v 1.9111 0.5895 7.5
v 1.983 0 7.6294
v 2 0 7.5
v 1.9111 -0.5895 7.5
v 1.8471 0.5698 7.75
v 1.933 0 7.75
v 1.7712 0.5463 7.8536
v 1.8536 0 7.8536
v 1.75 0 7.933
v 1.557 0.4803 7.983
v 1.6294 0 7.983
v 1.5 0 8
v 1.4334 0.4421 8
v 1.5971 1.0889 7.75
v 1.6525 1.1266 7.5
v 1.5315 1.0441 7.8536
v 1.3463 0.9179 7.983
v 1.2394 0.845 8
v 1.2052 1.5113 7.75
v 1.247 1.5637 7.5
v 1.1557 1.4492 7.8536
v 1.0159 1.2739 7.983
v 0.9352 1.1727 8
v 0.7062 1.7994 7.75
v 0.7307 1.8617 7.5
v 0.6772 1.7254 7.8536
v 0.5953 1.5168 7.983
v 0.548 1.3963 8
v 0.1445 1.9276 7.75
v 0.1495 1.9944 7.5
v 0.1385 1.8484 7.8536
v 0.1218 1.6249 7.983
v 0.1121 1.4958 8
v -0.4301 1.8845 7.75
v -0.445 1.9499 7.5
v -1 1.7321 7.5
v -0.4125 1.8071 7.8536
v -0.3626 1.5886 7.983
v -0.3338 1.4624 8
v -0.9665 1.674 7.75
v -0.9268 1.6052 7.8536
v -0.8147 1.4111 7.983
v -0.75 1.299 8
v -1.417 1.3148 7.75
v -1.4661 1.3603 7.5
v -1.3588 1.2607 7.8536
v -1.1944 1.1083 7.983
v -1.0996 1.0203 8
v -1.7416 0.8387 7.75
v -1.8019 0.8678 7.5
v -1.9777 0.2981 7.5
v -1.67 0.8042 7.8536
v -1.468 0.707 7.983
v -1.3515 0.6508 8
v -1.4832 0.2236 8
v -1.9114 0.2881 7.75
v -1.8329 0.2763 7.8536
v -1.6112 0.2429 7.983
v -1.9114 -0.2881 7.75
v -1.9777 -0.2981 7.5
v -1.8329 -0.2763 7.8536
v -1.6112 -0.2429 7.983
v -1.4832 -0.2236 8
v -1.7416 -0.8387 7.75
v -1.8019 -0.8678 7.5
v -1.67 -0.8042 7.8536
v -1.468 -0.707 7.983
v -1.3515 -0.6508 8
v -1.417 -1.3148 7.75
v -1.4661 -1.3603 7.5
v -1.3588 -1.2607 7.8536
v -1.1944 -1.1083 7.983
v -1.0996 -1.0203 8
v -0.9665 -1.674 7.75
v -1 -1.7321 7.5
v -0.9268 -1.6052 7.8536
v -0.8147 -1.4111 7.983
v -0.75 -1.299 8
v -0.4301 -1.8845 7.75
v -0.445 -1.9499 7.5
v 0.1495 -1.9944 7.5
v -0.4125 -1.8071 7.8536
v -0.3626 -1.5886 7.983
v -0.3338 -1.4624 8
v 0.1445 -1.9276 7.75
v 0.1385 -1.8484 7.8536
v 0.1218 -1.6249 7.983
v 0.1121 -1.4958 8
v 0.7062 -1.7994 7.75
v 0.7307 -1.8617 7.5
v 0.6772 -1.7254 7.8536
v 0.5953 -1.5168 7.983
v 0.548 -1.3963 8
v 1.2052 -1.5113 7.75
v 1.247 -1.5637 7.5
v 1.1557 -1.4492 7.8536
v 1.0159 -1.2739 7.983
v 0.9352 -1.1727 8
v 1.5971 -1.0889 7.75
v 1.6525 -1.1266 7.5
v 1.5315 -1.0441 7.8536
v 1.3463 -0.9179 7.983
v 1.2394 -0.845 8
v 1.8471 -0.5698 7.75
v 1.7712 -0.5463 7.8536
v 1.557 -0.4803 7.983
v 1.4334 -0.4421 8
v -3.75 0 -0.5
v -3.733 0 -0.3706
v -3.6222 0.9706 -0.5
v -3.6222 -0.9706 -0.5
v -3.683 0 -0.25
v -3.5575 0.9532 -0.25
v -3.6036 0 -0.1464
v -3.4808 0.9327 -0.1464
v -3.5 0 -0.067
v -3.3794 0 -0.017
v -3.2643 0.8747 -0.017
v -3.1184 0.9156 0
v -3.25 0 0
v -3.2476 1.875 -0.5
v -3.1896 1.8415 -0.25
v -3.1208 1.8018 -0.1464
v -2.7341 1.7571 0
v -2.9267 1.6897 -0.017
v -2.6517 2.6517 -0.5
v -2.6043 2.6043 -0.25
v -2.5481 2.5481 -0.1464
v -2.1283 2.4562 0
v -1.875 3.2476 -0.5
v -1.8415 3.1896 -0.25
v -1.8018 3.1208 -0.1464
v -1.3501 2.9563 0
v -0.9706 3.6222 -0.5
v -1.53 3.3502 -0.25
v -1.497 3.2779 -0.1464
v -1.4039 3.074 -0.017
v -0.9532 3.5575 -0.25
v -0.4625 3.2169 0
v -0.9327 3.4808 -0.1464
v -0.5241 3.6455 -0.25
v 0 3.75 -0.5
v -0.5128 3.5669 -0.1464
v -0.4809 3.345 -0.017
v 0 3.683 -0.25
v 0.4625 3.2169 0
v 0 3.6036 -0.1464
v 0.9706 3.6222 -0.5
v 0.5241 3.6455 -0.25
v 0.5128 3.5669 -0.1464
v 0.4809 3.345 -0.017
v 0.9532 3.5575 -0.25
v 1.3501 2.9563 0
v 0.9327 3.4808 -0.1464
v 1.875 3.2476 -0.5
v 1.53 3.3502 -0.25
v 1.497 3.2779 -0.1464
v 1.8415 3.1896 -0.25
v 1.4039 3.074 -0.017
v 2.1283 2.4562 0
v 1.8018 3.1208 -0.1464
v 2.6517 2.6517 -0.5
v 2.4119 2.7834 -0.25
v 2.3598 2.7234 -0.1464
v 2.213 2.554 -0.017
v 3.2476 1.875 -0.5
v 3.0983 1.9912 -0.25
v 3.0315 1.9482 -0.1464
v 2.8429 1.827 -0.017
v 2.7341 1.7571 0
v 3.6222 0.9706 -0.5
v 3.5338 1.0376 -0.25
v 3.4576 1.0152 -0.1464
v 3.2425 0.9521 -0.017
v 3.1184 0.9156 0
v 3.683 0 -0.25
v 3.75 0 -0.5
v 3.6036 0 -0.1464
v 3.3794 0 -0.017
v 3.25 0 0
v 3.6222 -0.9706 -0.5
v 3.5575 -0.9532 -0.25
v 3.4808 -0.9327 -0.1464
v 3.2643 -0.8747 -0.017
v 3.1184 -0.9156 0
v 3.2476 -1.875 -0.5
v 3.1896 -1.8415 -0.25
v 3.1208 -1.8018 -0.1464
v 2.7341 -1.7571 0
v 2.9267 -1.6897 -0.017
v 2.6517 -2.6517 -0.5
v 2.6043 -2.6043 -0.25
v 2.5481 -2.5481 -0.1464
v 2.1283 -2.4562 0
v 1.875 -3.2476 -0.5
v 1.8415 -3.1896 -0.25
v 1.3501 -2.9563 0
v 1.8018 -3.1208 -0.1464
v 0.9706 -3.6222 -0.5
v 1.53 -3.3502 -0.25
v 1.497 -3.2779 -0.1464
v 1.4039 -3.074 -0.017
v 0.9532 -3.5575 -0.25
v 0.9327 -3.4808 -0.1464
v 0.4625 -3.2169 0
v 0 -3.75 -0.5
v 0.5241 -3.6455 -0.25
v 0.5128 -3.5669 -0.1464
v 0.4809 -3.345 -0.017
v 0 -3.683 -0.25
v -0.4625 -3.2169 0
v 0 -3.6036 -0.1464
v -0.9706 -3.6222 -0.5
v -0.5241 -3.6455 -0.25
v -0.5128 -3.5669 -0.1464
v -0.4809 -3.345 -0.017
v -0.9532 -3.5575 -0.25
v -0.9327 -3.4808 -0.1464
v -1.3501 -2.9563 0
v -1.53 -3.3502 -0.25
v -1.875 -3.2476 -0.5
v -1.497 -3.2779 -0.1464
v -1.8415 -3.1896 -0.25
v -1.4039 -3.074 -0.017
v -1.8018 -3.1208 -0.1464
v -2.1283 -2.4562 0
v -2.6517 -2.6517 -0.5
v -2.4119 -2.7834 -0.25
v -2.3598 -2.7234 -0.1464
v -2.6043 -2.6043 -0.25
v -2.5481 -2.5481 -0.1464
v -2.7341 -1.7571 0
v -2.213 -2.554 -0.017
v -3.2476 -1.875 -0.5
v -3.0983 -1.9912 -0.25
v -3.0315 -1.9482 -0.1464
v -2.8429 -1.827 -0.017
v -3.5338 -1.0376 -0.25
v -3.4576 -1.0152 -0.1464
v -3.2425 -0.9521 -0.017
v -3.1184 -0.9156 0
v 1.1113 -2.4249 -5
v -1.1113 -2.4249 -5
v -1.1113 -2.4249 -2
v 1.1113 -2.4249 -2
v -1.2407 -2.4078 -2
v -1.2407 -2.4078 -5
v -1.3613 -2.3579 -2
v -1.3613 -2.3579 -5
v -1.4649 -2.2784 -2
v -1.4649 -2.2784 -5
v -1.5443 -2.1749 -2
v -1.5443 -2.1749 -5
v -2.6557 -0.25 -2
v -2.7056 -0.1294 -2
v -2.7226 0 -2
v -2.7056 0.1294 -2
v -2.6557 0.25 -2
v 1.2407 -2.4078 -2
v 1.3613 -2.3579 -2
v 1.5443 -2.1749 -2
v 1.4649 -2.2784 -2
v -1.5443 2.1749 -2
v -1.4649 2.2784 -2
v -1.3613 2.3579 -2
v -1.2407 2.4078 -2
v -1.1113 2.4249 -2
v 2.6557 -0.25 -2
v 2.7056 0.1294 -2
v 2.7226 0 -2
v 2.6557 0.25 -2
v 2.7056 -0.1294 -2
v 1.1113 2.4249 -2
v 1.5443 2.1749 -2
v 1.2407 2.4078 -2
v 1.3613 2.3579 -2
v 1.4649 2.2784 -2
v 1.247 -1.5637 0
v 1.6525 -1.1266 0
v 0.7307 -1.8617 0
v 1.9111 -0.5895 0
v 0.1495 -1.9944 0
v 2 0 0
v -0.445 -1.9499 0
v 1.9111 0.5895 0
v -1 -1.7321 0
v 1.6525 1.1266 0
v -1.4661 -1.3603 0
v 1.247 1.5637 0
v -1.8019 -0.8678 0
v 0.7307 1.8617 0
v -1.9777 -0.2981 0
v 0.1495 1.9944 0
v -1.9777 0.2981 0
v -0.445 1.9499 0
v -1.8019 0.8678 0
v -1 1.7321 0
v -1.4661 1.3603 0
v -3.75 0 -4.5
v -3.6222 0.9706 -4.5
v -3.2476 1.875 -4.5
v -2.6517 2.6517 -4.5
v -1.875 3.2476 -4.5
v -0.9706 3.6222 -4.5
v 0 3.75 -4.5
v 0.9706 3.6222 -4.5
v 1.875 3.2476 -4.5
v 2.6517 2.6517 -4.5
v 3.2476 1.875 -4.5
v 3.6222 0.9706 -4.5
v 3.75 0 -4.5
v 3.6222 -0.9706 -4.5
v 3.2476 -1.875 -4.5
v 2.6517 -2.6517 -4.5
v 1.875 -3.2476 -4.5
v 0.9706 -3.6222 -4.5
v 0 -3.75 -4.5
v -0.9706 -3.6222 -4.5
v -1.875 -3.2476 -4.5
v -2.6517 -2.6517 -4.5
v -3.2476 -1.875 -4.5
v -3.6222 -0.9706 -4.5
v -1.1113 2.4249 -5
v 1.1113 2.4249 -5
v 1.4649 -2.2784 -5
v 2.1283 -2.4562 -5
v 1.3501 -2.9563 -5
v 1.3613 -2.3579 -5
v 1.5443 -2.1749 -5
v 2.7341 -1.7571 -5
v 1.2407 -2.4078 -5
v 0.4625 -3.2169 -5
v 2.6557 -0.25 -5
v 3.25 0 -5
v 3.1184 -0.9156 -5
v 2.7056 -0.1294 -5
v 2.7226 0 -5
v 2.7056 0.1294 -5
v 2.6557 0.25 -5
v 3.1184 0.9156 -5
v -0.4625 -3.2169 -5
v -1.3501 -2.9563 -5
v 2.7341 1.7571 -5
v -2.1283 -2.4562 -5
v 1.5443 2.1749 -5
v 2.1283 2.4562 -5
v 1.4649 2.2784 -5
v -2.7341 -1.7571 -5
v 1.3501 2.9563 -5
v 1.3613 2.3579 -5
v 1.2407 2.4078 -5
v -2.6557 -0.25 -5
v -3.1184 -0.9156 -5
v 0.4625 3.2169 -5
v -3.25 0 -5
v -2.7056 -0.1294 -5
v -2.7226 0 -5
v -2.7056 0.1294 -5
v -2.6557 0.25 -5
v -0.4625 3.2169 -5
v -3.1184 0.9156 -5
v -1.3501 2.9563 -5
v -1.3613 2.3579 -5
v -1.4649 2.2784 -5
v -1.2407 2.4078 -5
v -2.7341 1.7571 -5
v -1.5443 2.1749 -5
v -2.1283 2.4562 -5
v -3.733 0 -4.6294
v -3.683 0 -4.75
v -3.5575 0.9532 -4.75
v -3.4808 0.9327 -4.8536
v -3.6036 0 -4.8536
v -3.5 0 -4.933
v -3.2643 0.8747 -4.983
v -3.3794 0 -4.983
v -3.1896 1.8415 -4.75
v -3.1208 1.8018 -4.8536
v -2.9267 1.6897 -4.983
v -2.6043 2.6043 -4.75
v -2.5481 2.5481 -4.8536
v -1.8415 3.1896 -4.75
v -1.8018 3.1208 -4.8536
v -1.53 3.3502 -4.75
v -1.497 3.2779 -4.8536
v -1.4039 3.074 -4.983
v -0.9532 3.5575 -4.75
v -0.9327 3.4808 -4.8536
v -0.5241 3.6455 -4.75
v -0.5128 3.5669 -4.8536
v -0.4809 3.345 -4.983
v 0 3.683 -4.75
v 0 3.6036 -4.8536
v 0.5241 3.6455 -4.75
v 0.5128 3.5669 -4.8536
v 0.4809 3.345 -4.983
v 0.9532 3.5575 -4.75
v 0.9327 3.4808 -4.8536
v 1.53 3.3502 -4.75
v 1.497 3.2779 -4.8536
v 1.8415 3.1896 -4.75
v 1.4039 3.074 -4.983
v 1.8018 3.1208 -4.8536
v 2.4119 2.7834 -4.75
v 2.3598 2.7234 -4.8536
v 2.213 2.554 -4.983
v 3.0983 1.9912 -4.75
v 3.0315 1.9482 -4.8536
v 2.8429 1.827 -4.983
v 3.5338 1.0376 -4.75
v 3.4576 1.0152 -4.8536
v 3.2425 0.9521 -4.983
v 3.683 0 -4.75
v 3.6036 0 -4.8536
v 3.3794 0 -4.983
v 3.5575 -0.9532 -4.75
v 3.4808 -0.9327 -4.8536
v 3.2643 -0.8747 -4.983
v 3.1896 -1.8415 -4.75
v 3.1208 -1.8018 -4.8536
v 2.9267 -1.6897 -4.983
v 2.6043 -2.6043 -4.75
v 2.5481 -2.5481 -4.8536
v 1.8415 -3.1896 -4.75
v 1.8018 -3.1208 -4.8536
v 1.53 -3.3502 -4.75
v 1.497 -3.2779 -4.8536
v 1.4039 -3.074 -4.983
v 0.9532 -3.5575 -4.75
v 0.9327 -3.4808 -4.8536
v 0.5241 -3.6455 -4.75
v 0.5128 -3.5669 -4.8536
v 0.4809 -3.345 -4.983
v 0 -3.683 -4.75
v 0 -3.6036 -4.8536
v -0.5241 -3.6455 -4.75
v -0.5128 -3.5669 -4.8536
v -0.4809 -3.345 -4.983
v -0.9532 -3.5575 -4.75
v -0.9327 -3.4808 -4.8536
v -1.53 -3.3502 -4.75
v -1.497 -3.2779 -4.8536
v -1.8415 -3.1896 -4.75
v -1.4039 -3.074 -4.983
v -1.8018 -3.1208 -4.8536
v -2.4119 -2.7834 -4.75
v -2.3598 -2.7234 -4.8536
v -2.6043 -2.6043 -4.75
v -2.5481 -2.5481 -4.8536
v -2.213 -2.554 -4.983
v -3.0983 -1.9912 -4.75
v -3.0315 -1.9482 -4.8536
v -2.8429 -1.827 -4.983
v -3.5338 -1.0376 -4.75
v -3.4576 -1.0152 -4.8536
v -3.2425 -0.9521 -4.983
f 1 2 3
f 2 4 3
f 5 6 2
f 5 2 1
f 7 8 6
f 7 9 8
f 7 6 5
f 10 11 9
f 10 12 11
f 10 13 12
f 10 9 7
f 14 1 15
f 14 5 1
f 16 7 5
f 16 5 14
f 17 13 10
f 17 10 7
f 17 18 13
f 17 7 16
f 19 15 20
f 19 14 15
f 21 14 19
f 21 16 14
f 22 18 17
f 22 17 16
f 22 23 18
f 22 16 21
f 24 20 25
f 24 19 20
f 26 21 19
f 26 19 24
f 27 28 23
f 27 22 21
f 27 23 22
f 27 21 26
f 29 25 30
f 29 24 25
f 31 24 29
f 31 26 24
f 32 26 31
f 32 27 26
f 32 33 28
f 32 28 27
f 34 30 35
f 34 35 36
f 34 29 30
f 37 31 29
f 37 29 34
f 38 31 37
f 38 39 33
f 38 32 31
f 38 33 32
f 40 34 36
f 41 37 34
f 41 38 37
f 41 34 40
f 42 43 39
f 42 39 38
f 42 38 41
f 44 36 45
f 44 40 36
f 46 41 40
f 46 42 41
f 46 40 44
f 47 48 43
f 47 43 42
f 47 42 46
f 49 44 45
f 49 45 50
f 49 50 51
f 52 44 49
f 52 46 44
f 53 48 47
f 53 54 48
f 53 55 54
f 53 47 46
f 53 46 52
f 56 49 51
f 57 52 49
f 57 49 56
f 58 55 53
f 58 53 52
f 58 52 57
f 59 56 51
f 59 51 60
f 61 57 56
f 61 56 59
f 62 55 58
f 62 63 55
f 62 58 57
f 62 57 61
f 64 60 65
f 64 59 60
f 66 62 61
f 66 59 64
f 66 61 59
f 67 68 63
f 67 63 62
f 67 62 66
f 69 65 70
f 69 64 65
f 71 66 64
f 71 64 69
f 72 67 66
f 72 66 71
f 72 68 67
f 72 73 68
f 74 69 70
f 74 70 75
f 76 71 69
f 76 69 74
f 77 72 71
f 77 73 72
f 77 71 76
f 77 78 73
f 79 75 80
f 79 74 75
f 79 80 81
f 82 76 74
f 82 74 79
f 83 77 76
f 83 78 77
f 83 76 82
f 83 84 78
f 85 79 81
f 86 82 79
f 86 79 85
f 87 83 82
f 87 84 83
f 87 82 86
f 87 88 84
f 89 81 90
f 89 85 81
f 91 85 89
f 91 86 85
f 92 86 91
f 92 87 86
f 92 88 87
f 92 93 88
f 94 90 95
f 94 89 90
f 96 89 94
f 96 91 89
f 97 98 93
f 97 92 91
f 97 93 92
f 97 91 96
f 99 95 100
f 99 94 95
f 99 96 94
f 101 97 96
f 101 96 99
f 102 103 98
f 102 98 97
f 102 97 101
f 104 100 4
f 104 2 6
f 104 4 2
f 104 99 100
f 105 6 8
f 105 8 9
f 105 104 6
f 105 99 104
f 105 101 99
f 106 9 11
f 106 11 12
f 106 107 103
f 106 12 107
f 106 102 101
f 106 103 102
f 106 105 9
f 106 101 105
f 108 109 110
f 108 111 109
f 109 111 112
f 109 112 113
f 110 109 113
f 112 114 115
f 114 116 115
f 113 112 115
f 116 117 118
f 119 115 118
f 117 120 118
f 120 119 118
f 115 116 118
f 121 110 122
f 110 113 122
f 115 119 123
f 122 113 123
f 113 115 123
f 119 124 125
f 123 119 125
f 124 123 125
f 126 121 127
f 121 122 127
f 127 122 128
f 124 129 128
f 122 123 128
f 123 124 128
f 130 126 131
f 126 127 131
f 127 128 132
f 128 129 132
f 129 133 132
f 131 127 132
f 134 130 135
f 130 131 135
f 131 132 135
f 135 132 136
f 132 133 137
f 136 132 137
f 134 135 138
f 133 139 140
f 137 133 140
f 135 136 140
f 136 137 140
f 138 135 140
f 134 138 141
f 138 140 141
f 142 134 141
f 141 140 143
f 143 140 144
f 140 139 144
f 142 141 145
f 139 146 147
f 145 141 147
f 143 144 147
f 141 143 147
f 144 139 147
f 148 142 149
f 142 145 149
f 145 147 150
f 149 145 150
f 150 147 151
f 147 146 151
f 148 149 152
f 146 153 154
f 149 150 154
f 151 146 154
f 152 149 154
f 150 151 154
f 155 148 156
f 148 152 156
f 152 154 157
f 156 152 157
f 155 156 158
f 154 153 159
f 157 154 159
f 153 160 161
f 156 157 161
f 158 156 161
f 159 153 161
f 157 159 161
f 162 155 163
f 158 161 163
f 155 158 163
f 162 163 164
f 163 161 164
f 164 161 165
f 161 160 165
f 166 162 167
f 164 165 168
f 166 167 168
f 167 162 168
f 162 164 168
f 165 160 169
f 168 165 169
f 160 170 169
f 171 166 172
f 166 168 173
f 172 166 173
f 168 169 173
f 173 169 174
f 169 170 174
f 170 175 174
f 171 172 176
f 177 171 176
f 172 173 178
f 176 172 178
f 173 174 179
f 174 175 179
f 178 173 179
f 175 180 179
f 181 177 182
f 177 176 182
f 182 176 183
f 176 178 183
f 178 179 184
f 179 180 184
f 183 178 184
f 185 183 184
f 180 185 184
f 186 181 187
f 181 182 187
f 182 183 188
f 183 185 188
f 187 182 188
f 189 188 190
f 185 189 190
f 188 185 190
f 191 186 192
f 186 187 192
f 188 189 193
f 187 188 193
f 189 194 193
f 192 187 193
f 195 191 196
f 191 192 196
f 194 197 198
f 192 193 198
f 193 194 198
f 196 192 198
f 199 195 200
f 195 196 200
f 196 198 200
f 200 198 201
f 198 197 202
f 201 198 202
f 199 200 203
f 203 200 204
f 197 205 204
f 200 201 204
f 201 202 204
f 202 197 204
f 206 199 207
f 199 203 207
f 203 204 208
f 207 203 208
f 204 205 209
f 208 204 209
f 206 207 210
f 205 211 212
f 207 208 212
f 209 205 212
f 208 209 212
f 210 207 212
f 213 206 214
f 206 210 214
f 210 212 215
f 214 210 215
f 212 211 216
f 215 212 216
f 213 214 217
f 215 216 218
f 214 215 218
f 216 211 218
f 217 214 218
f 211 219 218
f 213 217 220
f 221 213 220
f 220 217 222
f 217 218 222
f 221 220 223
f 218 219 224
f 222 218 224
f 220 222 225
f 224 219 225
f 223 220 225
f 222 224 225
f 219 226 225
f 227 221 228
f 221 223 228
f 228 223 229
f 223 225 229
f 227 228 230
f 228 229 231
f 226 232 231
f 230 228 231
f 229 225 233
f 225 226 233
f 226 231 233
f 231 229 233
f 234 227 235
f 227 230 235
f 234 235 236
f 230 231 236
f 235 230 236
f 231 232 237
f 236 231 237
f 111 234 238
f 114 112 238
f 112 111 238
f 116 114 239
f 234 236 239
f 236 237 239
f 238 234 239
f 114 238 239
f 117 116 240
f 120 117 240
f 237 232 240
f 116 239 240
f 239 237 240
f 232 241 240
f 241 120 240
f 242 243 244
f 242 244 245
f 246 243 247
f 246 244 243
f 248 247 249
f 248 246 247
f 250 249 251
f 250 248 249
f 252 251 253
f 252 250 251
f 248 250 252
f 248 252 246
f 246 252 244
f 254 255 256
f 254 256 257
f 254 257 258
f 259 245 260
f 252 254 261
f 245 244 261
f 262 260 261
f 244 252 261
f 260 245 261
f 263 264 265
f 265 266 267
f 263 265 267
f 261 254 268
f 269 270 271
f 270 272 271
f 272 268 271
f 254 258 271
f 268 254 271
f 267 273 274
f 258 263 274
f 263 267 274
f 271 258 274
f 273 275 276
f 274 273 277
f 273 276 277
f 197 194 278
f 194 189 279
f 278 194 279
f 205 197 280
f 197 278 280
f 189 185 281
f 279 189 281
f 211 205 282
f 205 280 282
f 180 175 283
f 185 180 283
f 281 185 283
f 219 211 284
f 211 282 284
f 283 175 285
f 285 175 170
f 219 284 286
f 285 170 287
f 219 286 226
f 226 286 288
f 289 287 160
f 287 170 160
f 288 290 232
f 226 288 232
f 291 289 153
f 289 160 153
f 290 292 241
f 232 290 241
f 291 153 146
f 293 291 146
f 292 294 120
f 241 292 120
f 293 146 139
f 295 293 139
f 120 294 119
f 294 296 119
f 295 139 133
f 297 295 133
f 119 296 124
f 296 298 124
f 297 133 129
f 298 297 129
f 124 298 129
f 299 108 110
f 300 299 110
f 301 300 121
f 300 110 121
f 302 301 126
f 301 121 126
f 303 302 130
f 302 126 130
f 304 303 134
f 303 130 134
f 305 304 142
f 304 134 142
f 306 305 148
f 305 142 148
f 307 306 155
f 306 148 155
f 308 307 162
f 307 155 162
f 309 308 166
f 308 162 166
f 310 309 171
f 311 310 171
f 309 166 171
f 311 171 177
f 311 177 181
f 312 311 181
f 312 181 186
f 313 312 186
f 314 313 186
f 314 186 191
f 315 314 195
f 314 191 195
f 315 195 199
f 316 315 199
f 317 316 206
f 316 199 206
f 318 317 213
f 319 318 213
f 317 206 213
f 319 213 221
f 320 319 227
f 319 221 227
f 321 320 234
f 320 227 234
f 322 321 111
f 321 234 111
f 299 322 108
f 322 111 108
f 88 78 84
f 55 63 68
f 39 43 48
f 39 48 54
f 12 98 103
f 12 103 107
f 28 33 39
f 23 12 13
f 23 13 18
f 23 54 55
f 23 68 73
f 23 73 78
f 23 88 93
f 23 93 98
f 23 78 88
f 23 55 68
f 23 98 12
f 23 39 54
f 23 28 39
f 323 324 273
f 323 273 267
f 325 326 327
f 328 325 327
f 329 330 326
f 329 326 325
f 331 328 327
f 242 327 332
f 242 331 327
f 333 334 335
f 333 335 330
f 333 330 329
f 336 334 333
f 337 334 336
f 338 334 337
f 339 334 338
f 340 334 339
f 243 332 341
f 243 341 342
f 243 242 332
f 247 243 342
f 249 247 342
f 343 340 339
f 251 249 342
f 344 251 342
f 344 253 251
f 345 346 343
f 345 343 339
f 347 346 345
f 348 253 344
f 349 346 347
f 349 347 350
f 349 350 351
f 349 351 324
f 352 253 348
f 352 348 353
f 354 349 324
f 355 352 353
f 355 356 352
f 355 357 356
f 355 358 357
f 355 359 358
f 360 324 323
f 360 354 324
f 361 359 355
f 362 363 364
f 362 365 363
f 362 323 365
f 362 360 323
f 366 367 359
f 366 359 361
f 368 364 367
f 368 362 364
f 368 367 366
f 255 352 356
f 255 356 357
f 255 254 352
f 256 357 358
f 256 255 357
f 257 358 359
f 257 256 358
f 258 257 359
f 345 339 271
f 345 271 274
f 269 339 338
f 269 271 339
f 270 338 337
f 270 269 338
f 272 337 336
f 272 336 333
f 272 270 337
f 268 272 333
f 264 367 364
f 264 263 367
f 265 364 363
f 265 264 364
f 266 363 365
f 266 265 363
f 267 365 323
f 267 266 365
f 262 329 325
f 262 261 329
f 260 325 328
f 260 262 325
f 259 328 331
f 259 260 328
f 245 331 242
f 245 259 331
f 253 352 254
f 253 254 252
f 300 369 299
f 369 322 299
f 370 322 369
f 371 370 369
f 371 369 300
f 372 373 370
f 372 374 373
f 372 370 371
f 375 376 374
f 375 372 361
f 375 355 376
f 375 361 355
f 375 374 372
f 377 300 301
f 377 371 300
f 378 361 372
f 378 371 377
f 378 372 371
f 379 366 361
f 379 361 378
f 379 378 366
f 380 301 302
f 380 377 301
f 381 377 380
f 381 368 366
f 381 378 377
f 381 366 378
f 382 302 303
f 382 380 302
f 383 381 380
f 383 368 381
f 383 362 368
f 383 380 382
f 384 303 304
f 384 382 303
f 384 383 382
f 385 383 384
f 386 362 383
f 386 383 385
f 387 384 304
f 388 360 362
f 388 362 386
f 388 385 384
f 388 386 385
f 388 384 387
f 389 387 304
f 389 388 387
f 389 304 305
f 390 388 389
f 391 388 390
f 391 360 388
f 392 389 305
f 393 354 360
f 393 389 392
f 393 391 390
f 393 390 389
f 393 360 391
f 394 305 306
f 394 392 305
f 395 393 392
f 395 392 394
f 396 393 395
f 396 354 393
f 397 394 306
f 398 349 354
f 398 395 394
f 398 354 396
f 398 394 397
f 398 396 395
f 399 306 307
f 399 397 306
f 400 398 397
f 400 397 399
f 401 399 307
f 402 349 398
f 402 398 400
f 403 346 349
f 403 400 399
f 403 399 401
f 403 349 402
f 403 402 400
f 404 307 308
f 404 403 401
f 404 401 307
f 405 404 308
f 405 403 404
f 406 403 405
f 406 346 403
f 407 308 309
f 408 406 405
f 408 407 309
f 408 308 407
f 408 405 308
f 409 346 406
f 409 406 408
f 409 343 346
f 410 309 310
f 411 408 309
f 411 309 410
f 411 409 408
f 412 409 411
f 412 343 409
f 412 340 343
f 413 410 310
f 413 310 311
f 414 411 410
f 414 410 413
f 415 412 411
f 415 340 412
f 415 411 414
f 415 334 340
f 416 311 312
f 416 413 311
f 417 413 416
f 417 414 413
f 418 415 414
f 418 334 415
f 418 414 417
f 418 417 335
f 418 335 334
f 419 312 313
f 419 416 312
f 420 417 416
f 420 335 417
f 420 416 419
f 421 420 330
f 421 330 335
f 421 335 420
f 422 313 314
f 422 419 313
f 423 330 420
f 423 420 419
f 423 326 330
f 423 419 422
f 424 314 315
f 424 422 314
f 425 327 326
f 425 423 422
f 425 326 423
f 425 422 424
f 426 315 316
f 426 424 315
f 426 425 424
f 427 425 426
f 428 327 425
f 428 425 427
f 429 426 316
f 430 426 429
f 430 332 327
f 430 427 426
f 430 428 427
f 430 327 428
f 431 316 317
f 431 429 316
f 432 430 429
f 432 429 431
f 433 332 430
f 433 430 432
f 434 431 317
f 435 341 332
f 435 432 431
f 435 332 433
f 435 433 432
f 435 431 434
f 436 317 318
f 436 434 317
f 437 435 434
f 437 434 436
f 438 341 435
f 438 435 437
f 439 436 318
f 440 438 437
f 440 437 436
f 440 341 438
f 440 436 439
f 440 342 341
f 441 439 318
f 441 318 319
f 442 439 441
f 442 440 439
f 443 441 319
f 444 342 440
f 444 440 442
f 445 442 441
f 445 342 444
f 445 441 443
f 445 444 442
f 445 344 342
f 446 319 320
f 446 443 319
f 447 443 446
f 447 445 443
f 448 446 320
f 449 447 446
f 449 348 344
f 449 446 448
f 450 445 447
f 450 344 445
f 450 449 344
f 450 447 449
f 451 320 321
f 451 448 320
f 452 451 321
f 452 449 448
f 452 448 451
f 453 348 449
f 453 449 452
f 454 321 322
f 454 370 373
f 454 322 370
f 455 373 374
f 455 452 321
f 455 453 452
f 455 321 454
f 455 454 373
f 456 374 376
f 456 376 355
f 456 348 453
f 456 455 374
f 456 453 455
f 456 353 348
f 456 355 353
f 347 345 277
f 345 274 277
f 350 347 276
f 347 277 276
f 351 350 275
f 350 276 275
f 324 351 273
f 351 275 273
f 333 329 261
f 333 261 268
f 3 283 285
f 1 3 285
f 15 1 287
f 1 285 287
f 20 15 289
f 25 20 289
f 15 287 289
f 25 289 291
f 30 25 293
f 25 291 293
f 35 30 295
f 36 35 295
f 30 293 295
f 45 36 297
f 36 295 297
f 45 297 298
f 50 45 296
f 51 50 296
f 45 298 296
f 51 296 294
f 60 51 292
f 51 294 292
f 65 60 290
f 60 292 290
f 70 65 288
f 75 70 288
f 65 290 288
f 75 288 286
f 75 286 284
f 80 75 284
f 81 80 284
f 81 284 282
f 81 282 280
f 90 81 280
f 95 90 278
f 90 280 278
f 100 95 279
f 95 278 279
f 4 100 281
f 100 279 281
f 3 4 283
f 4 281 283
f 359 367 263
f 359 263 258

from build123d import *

# Parameters (mm, degrees)
SKETCH_1_R          = 2
EXTRUDE_1_DEPTH     = 8
SKETCH_2_R          = 3.75
EXTRUDE_2_DEPTH     = 5
CUT_EXTRUDE_2_DEPTH = 3
FILLET_1_R          = 0.5


with BuildPart() as part:
    # 草图1 → 凸台-拉伸1 (new body)
    with BuildSketch(Plane.XY):
        Circle(SKETCH_1_R)
    extrude(amount=EXTRUDE_1_DEPTH)

    # 草图2 → 凸台-拉伸2 (add)
    with BuildSketch(Plane(origin=(0, 0, 0), x_dir=(-1, 0, 0), z_dir=(0, 0, -1))):
        Circle(SKETCH_2_R)
    extrude(amount=EXTRUDE_2_DEPTH)

    # 草图4 → 切除-拉伸2 (cut)
    with BuildSketch(Plane(origin=(0, 0, -5), x_dir=(-1, 0, 0), z_dir=(0, 0, -1))):
        Polygon((-1.4, 2.424871131), (1.4, 2.424871131), (2.8, 0), (1.4, -2.424871131), (-1.4, -2.424871131), (-2.8, 0), align=None)
    extrude(amount=-CUT_EXTRUDE_2_DEPTH, mode=Mode.SUBTRACT)

    # 圆角1
    fillet_1_edges = [part.edges().sort_by_distance(p)[0] for p in [
        (-1.4, 2.424871131, -3.5),
        (-2.8, 0, -3.5),
        (-1.4, -2.424871131, -3.5),
        (1.4, -2.424871131, -3.5),
        (2.8, 0, -3.5),
        (1.4, 2.424871131, -3.5),
        (-2, 0, 8),
        (3.75, 0, 0),
        (3.75, 0, -5),
    ]]
    fillet(fillet_1_edges, radius=FILLET_1_R)


solid = part.part
